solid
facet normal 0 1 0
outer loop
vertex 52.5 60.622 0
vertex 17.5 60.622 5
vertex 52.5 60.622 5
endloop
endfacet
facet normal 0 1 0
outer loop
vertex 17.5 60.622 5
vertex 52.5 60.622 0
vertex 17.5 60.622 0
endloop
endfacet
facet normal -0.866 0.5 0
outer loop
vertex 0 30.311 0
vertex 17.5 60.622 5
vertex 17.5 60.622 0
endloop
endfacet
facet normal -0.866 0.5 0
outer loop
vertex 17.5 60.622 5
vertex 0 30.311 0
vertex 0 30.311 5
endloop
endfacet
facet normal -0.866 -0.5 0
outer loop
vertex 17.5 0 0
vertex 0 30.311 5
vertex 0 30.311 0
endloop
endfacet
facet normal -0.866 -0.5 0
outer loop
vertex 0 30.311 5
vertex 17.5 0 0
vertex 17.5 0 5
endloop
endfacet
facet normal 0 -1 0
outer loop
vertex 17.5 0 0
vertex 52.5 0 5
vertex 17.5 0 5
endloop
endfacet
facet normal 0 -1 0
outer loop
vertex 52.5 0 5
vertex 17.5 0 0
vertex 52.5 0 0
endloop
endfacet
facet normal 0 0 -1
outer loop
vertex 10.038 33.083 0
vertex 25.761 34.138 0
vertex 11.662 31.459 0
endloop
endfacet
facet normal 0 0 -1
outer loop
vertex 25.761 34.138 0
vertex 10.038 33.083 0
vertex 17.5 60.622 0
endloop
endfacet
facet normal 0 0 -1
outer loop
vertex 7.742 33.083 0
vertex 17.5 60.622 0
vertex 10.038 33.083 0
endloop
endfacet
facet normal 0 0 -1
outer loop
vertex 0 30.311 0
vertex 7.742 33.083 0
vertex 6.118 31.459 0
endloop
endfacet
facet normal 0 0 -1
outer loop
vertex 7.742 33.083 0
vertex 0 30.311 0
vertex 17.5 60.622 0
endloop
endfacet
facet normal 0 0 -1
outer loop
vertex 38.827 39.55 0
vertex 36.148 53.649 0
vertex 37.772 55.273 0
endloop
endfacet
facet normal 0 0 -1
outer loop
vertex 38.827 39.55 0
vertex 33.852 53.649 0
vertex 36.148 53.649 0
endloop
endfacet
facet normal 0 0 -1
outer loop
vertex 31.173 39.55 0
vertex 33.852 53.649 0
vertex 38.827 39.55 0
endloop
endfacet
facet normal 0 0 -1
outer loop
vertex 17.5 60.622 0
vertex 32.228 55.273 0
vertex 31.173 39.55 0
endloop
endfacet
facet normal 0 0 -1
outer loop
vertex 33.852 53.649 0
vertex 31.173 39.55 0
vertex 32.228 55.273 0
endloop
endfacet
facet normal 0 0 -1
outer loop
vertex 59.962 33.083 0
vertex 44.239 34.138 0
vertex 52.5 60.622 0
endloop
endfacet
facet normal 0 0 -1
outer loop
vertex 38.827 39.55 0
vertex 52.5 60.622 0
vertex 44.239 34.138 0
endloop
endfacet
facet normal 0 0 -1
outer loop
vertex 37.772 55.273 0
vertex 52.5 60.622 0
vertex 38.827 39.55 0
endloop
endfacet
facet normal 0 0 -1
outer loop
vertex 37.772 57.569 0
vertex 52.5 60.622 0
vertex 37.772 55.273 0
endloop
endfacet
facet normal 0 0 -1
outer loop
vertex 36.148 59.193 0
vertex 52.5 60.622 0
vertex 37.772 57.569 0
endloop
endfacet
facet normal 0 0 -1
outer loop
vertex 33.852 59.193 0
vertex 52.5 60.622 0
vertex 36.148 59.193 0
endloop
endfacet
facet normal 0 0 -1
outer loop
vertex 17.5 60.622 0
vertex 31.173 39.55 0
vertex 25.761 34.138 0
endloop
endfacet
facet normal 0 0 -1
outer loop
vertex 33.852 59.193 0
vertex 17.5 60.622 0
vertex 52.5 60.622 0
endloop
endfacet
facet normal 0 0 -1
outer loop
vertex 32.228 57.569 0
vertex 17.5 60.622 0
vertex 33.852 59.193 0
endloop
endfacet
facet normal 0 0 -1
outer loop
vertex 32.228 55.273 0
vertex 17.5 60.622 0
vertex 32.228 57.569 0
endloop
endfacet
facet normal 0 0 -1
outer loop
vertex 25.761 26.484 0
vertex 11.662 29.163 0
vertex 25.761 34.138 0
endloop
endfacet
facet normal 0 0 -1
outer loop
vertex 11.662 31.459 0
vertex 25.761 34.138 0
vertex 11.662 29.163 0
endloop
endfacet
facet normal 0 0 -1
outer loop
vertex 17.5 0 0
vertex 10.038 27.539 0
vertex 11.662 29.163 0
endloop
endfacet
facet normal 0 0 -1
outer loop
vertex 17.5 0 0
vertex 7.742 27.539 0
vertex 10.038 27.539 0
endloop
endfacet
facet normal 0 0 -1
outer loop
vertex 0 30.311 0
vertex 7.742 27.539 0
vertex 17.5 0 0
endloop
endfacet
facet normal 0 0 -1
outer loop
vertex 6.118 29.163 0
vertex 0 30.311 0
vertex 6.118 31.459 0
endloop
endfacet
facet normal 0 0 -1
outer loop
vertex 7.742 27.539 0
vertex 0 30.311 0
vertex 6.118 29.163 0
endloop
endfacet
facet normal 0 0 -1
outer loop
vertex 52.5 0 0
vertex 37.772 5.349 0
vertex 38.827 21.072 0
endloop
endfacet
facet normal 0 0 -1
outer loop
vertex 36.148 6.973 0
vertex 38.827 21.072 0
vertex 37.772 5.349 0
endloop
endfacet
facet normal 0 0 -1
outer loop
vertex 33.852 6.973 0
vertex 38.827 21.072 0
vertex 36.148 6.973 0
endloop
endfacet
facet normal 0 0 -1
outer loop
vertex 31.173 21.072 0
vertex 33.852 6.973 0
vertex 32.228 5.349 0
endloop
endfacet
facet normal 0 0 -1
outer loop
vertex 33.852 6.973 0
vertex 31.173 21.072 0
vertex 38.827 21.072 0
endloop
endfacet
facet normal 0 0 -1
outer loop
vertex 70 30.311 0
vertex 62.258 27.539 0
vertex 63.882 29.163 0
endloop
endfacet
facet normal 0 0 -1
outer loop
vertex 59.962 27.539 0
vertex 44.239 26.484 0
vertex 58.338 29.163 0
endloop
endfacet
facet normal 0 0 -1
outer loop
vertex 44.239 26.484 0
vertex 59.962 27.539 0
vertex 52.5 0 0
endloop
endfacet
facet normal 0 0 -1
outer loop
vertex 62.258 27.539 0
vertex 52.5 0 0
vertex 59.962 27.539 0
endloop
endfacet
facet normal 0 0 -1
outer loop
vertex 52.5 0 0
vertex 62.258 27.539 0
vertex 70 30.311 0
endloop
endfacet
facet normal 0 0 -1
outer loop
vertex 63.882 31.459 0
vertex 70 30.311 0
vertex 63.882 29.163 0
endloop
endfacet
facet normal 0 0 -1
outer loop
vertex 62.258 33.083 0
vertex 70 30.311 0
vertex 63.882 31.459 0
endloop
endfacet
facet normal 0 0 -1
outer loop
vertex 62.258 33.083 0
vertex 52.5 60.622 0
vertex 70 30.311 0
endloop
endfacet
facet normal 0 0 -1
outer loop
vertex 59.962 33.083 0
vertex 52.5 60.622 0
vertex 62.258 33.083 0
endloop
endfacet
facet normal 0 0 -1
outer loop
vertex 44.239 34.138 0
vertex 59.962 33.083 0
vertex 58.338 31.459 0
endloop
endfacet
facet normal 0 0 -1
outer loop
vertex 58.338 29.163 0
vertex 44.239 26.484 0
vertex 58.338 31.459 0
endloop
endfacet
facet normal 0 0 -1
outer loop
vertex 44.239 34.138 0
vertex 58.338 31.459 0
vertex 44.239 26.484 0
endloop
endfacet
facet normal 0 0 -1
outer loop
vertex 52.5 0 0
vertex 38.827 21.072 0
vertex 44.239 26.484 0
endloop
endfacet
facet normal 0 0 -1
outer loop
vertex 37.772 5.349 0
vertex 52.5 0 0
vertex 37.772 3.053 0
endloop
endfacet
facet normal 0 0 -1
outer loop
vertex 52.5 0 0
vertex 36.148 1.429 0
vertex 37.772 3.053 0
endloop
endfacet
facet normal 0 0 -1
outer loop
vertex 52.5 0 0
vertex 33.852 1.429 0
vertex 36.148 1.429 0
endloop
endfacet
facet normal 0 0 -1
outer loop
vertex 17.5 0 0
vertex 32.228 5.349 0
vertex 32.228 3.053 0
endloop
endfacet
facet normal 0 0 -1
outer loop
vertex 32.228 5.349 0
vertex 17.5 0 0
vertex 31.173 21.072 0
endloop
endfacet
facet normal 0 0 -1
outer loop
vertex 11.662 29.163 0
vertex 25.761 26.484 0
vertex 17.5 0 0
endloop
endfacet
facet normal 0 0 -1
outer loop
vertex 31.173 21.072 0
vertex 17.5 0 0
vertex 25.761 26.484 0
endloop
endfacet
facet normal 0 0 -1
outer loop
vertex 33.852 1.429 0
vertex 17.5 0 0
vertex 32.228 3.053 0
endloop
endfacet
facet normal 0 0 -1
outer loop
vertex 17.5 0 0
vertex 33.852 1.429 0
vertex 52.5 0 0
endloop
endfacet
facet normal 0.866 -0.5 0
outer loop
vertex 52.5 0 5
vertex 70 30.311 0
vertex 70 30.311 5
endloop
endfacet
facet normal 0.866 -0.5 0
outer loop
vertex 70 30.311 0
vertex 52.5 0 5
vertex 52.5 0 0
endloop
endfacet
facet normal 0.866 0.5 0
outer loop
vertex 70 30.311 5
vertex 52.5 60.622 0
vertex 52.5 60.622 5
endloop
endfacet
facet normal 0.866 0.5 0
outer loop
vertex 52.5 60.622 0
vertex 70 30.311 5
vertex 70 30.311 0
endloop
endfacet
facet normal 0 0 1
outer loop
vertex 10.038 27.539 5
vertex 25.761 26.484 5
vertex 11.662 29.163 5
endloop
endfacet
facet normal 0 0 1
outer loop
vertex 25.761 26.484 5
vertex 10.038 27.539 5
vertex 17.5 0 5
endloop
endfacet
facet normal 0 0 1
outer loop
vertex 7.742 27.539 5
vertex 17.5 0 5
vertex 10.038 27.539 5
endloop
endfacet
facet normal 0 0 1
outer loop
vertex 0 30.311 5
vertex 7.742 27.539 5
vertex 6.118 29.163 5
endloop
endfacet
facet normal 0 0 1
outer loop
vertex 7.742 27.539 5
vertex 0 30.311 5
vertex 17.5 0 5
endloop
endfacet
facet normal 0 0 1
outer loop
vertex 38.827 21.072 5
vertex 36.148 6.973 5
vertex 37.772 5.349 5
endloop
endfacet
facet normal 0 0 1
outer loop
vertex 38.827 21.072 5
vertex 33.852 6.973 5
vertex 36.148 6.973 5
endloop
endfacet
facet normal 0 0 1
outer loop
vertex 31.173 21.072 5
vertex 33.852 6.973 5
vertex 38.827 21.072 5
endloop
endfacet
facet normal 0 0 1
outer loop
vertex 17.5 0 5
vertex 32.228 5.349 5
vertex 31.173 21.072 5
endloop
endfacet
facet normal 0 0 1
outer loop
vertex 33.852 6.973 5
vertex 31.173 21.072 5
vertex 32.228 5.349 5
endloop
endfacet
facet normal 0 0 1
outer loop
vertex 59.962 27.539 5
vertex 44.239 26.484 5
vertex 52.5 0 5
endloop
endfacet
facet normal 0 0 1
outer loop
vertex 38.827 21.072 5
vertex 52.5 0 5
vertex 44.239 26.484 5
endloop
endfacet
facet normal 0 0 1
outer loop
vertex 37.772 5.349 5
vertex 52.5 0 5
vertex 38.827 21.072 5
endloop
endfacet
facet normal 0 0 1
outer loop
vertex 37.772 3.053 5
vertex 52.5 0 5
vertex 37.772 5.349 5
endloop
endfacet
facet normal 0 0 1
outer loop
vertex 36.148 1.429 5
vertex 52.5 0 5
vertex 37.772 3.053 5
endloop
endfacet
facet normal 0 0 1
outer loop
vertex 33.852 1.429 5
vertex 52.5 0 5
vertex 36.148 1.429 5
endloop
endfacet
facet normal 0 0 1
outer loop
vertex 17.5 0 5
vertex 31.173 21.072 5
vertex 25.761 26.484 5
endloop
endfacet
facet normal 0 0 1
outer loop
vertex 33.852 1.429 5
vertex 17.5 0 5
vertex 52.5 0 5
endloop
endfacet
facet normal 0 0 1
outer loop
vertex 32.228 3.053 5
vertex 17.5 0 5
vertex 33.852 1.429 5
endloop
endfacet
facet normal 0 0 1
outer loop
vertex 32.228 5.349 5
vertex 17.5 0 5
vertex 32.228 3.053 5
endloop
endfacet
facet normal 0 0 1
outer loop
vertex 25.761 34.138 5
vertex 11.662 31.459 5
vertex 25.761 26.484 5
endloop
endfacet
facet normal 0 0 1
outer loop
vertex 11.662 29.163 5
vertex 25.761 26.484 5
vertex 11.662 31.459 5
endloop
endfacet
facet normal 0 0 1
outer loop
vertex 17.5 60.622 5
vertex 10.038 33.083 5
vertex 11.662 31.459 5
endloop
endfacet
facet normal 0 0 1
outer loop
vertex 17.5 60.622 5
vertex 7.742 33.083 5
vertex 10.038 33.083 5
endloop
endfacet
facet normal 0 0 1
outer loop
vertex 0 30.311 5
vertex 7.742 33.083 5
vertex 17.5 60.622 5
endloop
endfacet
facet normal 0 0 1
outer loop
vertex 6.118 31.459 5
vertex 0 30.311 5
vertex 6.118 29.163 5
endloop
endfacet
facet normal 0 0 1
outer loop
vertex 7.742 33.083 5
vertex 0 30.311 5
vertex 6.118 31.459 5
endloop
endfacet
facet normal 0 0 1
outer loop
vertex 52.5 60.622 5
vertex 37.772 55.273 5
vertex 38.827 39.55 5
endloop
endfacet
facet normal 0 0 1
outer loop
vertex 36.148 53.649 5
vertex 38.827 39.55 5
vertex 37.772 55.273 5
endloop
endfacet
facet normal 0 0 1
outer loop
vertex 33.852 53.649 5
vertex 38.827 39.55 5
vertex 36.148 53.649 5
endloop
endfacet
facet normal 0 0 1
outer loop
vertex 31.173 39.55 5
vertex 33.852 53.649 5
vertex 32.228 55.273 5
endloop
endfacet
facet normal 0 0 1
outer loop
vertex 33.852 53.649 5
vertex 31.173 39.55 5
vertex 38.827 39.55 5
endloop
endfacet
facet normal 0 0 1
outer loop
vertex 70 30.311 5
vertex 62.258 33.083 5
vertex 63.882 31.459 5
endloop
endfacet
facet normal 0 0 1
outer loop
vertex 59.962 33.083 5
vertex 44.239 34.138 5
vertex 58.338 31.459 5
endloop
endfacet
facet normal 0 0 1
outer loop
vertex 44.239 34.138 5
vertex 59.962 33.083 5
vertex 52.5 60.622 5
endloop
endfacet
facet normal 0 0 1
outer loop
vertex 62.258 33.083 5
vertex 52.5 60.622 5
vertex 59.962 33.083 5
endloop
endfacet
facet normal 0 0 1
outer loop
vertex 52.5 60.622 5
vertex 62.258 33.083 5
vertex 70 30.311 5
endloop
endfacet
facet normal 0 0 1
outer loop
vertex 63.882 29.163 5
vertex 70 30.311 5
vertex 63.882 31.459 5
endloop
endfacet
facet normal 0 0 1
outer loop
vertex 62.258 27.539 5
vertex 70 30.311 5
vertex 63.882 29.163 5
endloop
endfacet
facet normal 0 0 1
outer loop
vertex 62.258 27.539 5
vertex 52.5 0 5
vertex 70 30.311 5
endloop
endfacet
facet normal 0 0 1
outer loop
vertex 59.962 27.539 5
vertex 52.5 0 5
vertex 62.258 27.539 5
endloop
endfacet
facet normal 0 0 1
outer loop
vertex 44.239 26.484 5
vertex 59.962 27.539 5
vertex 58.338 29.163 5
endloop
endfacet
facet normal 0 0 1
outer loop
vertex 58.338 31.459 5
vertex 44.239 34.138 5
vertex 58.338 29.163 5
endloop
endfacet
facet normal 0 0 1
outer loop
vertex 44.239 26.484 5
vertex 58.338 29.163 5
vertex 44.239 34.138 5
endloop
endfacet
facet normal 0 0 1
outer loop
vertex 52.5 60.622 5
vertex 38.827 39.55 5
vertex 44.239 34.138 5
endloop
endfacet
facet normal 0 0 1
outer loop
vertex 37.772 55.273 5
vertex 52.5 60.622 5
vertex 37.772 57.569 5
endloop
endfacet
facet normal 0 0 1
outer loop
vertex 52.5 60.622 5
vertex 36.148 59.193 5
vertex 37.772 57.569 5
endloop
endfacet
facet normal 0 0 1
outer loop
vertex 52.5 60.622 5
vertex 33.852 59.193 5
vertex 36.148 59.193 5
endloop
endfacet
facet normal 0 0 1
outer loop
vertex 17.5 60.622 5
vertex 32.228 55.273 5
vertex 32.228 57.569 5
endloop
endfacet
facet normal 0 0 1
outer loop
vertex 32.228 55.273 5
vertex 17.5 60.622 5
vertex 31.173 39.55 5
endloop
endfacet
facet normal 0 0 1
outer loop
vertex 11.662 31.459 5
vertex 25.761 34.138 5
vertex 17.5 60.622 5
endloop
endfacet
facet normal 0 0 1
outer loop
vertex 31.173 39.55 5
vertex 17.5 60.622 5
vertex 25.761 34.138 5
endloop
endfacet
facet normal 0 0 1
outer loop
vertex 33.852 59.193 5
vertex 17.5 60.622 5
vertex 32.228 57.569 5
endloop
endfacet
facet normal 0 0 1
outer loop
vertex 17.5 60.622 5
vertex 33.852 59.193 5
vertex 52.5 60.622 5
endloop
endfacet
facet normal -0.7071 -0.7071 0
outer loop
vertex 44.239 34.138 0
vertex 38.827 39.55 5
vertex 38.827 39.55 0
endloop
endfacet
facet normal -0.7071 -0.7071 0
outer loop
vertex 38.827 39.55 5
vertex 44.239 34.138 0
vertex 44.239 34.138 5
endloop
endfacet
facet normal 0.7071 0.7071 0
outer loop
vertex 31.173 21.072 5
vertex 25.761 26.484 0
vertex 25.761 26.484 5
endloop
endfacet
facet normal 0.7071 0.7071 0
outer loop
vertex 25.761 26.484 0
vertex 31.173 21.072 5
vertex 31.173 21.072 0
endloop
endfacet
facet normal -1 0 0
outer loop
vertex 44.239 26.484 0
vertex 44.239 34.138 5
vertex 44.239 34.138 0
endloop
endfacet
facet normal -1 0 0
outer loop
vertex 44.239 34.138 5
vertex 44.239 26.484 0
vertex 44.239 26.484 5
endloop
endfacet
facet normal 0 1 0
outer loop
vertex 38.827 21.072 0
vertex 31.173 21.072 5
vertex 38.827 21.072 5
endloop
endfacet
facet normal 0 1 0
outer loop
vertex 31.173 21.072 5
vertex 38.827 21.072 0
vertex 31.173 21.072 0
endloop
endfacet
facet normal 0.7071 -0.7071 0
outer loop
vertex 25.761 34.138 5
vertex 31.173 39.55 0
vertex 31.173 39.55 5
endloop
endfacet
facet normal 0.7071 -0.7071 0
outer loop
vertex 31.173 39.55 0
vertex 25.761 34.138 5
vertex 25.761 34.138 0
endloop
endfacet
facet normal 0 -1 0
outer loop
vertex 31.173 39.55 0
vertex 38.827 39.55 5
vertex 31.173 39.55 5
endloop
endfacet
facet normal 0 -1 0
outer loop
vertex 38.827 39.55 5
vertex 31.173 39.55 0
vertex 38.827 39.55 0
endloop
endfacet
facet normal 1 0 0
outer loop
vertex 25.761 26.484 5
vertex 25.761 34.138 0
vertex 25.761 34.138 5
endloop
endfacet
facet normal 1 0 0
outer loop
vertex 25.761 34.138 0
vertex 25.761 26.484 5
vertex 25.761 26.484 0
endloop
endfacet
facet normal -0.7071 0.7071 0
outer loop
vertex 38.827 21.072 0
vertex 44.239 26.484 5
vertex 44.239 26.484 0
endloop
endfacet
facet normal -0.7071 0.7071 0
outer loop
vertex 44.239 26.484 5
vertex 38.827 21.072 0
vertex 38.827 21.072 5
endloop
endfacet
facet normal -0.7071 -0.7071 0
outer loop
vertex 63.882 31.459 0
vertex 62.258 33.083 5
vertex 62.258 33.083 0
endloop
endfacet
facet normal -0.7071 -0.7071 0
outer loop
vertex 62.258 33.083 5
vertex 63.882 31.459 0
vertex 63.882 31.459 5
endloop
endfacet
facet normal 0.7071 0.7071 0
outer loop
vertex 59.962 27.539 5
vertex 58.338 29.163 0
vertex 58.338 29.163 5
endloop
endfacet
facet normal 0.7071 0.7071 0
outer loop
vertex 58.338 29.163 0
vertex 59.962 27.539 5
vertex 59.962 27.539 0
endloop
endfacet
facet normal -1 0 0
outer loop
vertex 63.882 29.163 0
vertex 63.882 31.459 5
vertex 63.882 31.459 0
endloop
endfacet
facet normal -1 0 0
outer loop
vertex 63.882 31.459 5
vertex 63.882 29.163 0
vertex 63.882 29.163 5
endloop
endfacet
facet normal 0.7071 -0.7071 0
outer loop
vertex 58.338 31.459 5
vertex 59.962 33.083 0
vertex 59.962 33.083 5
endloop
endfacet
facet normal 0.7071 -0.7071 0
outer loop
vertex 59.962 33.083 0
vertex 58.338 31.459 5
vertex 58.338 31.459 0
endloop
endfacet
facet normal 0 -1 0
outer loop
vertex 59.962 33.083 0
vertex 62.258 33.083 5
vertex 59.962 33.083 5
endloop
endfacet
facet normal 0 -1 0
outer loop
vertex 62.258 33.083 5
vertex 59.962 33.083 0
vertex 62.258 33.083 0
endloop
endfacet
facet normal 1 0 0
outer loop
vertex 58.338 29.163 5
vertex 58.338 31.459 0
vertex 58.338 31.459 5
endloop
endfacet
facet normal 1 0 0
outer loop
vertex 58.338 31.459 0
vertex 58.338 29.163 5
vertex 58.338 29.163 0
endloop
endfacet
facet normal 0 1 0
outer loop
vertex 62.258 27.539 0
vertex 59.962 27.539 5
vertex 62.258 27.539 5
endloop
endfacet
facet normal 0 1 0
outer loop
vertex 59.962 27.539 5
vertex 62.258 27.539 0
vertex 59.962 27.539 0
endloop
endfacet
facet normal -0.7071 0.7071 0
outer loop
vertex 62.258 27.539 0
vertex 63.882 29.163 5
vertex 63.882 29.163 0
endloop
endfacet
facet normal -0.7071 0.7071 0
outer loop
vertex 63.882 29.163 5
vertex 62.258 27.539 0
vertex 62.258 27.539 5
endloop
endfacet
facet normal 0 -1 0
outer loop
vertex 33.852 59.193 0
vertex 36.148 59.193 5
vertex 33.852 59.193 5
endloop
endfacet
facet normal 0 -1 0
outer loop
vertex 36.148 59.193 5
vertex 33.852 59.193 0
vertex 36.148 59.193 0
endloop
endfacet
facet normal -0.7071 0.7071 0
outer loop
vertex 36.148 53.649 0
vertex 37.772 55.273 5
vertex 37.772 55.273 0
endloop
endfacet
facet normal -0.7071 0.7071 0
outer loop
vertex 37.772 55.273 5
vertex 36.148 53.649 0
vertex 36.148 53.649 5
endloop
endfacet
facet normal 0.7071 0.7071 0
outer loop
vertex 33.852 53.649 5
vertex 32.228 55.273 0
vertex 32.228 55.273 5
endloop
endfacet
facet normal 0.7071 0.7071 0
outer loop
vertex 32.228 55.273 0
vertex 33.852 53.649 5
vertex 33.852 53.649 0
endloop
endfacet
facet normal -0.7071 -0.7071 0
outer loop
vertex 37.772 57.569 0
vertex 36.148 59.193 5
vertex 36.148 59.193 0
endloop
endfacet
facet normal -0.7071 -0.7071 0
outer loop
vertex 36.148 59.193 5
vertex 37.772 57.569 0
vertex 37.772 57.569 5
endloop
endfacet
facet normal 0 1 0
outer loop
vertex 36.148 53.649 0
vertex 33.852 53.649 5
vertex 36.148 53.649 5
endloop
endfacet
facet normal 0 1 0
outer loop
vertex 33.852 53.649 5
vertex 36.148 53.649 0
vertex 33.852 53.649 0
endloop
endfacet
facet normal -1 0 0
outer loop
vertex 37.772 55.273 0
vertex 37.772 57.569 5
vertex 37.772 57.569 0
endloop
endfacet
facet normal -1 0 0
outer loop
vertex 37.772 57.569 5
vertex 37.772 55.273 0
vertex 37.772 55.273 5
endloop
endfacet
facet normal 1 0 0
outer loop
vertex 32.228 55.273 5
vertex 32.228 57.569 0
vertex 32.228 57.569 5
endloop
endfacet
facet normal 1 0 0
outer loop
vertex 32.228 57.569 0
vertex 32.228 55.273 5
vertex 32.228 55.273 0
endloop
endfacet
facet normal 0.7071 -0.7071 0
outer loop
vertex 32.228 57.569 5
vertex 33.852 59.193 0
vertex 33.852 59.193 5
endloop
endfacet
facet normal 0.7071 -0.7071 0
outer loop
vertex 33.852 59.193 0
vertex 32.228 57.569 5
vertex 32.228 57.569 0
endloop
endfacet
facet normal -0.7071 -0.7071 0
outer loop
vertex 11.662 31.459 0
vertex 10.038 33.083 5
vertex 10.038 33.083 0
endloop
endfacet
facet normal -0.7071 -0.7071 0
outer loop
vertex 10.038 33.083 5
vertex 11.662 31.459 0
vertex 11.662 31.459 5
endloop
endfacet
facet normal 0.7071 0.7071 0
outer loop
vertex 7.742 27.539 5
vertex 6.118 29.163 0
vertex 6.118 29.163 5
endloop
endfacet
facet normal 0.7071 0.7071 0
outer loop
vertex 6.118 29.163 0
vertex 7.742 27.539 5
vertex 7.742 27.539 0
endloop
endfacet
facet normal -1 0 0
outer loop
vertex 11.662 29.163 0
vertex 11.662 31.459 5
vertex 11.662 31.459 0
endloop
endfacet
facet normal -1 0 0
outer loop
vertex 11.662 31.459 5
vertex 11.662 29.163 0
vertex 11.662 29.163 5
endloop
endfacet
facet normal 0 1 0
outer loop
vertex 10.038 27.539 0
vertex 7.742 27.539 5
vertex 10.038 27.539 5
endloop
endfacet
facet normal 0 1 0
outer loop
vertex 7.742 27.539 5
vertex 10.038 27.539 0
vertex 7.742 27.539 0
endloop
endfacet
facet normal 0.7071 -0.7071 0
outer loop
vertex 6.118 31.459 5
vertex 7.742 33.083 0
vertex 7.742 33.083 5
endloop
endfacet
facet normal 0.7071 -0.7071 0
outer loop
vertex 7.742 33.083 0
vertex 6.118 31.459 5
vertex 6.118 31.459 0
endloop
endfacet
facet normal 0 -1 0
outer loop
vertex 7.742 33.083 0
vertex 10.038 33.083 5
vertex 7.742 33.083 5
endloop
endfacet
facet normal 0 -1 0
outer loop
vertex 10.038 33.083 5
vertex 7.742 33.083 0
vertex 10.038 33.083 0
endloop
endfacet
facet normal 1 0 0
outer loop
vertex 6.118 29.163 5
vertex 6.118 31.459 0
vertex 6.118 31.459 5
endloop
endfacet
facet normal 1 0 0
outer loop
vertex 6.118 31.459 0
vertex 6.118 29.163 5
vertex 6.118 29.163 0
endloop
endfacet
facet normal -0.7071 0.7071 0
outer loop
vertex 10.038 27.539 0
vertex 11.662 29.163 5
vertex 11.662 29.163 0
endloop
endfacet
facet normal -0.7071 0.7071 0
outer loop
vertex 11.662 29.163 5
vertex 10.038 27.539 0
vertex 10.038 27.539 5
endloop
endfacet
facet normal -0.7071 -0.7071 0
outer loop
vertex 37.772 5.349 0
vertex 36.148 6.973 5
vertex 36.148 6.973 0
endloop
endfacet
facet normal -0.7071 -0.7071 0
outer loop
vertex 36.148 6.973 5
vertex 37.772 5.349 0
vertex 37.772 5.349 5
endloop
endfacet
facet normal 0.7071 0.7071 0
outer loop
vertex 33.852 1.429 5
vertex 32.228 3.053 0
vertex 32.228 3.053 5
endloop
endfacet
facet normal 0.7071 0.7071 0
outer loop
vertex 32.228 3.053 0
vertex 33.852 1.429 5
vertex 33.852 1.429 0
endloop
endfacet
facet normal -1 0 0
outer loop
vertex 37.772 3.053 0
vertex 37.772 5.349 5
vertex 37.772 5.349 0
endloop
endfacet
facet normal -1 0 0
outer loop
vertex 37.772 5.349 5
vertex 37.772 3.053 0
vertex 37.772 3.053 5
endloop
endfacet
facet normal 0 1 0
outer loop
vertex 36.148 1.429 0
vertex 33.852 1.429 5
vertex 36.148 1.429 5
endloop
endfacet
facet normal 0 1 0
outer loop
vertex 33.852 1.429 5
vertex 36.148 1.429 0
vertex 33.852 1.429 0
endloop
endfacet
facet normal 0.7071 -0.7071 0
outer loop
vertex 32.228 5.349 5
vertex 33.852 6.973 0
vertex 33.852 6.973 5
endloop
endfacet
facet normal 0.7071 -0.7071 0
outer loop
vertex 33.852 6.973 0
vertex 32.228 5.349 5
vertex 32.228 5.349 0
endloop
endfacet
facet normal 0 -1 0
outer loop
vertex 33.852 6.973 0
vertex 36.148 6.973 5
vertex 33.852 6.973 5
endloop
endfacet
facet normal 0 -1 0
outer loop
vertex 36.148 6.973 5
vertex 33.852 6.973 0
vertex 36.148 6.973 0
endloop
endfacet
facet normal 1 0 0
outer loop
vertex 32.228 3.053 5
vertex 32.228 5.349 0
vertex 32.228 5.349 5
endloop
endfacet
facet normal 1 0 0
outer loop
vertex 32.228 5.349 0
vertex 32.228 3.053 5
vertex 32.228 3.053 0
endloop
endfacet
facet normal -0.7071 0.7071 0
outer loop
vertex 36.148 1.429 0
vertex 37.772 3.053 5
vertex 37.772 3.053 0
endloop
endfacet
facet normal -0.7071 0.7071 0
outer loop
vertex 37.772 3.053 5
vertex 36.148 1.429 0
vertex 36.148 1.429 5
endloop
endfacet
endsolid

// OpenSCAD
$fn = 32;

// ----------------------------------------------------------------------
// Polygon plate: 6-gon R35, 4 bolt windows
// ----------------------------------------------------------------------

// --- parameters (mm) ---
sides = 6;                // number of polygon sides
plate_r = 35;             // circumscribed radius of the polygon
bore_r = 10;              // centre bore radius
bolts = 4;                // number of bolt windows
ring_r = 26.11;           // bolt-circle radius
bolt_r = 3;               // bolt window radius
plate_t = 5;              // plate thickness, Z (extrusion height)

plate_d = 2 * plate_r;  // circumscribed diameter
bore_d = 2 * bore_r;  // centre bore diameter
bolt_d = 2 * bolt_r;  // bolt window diameter
ring_d = 2 * ring_r;  // bolt-circle diameter

profile = [[70, 30.311], [52.5, 60.622], [17.5, 60.622], [0, 30.311], [17.5, 0], [52.5, 0]];  // primary outline, 6 points, counter clockwise
void_1 = [[44.239, 34.138], [38.827, 39.55], [31.173, 39.55], [25.761, 34.138], [25.761, 26.484], [31.173, 21.072], [38.827, 21.072], [44.239, 26.484]];  // centre bore, 8 points
void_2 = [[63.882, 31.459], [62.258, 33.083], [59.962, 33.083], [58.338, 31.459], [58.338, 29.163], [59.962, 27.539], [62.258, 27.539], [63.882, 29.163]];  // bolt window 1, 8 points
void_3 = [[37.772, 57.569], [36.148, 59.193], [33.852, 59.193], [32.228, 57.569], [32.228, 55.273], [33.852, 53.649], [36.148, 53.649], [37.772, 55.273]];  // bolt window 2, 8 points
void_4 = [[11.662, 31.459], [10.038, 33.083], [7.742, 33.083], [6.118, 31.459], [6.118, 29.163], [7.742, 27.539], [10.038, 27.539], [11.662, 29.163]];  // bolt window 3, 8 points
void_5 = [[37.772, 5.349], [36.148, 6.973], [33.852, 6.973], [32.228, 5.349], [32.228, 3.053], [33.852, 1.429], [36.148, 1.429], [37.772, 3.053]];  // bolt window 4, 8 points

// --- the one profile operation ---
difference() {
  linear_extrude(height = plate_t) polygon(points = profile);
  translate([0, 0, -1])
    linear_extrude(height = plate_t + 2) polygon(points = void_1);
  translate([0, 0, -1])
    linear_extrude(height = plate_t + 2) polygon(points = void_2);
  translate([0, 0, -1])
    linear_extrude(height = plate_t + 2) polygon(points = void_3);
  translate([0, 0, -1])
    linear_extrude(height = plate_t + 2) polygon(points = void_4);
  translate([0, 0, -1])
    linear_extrude(height = plate_t + 2) polygon(points = void_5);
}
